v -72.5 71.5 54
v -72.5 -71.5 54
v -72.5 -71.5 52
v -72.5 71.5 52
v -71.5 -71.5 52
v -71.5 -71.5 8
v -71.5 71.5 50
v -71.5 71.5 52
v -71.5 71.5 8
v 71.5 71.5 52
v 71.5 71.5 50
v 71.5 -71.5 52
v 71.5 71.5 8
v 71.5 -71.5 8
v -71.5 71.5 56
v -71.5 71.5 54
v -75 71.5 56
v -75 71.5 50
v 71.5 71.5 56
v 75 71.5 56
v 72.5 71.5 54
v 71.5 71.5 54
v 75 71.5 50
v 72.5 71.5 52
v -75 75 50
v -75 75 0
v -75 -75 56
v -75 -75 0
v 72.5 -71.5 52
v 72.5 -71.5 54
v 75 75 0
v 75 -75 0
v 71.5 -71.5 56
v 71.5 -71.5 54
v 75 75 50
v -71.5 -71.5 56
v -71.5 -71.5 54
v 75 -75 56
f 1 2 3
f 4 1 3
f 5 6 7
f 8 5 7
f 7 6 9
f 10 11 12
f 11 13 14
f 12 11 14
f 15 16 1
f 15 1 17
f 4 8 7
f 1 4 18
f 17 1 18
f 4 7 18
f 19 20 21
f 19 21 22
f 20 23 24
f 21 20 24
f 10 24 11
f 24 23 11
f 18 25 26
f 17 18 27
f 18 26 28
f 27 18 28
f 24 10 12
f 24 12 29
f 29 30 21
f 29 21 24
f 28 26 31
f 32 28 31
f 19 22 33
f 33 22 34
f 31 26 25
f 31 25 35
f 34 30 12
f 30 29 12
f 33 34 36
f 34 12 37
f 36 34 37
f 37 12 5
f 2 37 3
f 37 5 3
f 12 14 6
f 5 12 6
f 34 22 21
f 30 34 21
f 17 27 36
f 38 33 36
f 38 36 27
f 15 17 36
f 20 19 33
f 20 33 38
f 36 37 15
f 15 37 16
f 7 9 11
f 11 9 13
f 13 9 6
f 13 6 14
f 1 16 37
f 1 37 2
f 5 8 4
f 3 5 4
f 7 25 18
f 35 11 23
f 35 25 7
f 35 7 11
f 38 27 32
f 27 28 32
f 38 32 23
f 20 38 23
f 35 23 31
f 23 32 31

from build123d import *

# Parameters (mm, degrees)
SKETCH1_W           = 150
SKETCH1_H           = 150
BOSS_EXTRUDE1_DEPTH = 8
SKETCH4_W           = 150
SKETCH4_H           = 150
SKETCH4_W_2         = 143
SKETCH4_H_2         = 143
BOSS_EXTRUDE2_DEPTH = 42
EXTRUDE_THIN1_DEPTH = 6
SKETCH6_W           = 2
SKETCH6_H           = 2
CUT_EXTRUDE1_DEPTH  = 143


with BuildPart() as part:
    # Sketch1 → Boss-Extrude1 (new body)
    with BuildSketch(Plane.XY):
        Rectangle(SKETCH1_W, SKETCH1_H)
    extrude(amount=BOSS_EXTRUDE1_DEPTH)

    # Sketch4 → Boss-Extrude2 (add)
    with BuildSketch(Plane.XY.offset(8)):
        Rectangle(SKETCH4_W, SKETCH4_H)
        Rectangle(SKETCH4_W_2, SKETCH4_H_2, mode=Mode.SUBTRACT)
    extrude(amount=BOSS_EXTRUDE2_DEPTH)

    # Sketch5 → Extrude-Thin1 (add)
    with BuildSketch(Plane.XY.offset(50)):
        Polygon((71.5, 71.5), (71.5, -71.5), (-71.5, -71.5), (-71.5, 71.5), (-75, 71.5), (-75, -75), (75, -75), (75, 71.5), align=None)
    extrude(amount=EXTRUDE_THIN1_DEPTH)

    # Sketch6 → Cut-Extrude1 (cut)
    with BuildSketch(Plane(origin=(0, 71.5, 0), x_dir=(1, 0, 0), z_dir=(0, 1, 0))):
        with Locations((71.5, -53)):
            Rectangle(SKETCH6_W, SKETCH6_H)
    cut_extrude1 = extrude(amount=-CUT_EXTRUDE1_DEPTH, mode=Mode.SUBTRACT)

    # Mirror1: Cut-Extrude1 across plane
    add(cut_extrude1.mirror(Plane(origin=(0, 0, 0), x_dir=(0, 0, 1), z_dir=(1, 0, 0))), mode=Mode.SUBTRACT)


solid = part.part
